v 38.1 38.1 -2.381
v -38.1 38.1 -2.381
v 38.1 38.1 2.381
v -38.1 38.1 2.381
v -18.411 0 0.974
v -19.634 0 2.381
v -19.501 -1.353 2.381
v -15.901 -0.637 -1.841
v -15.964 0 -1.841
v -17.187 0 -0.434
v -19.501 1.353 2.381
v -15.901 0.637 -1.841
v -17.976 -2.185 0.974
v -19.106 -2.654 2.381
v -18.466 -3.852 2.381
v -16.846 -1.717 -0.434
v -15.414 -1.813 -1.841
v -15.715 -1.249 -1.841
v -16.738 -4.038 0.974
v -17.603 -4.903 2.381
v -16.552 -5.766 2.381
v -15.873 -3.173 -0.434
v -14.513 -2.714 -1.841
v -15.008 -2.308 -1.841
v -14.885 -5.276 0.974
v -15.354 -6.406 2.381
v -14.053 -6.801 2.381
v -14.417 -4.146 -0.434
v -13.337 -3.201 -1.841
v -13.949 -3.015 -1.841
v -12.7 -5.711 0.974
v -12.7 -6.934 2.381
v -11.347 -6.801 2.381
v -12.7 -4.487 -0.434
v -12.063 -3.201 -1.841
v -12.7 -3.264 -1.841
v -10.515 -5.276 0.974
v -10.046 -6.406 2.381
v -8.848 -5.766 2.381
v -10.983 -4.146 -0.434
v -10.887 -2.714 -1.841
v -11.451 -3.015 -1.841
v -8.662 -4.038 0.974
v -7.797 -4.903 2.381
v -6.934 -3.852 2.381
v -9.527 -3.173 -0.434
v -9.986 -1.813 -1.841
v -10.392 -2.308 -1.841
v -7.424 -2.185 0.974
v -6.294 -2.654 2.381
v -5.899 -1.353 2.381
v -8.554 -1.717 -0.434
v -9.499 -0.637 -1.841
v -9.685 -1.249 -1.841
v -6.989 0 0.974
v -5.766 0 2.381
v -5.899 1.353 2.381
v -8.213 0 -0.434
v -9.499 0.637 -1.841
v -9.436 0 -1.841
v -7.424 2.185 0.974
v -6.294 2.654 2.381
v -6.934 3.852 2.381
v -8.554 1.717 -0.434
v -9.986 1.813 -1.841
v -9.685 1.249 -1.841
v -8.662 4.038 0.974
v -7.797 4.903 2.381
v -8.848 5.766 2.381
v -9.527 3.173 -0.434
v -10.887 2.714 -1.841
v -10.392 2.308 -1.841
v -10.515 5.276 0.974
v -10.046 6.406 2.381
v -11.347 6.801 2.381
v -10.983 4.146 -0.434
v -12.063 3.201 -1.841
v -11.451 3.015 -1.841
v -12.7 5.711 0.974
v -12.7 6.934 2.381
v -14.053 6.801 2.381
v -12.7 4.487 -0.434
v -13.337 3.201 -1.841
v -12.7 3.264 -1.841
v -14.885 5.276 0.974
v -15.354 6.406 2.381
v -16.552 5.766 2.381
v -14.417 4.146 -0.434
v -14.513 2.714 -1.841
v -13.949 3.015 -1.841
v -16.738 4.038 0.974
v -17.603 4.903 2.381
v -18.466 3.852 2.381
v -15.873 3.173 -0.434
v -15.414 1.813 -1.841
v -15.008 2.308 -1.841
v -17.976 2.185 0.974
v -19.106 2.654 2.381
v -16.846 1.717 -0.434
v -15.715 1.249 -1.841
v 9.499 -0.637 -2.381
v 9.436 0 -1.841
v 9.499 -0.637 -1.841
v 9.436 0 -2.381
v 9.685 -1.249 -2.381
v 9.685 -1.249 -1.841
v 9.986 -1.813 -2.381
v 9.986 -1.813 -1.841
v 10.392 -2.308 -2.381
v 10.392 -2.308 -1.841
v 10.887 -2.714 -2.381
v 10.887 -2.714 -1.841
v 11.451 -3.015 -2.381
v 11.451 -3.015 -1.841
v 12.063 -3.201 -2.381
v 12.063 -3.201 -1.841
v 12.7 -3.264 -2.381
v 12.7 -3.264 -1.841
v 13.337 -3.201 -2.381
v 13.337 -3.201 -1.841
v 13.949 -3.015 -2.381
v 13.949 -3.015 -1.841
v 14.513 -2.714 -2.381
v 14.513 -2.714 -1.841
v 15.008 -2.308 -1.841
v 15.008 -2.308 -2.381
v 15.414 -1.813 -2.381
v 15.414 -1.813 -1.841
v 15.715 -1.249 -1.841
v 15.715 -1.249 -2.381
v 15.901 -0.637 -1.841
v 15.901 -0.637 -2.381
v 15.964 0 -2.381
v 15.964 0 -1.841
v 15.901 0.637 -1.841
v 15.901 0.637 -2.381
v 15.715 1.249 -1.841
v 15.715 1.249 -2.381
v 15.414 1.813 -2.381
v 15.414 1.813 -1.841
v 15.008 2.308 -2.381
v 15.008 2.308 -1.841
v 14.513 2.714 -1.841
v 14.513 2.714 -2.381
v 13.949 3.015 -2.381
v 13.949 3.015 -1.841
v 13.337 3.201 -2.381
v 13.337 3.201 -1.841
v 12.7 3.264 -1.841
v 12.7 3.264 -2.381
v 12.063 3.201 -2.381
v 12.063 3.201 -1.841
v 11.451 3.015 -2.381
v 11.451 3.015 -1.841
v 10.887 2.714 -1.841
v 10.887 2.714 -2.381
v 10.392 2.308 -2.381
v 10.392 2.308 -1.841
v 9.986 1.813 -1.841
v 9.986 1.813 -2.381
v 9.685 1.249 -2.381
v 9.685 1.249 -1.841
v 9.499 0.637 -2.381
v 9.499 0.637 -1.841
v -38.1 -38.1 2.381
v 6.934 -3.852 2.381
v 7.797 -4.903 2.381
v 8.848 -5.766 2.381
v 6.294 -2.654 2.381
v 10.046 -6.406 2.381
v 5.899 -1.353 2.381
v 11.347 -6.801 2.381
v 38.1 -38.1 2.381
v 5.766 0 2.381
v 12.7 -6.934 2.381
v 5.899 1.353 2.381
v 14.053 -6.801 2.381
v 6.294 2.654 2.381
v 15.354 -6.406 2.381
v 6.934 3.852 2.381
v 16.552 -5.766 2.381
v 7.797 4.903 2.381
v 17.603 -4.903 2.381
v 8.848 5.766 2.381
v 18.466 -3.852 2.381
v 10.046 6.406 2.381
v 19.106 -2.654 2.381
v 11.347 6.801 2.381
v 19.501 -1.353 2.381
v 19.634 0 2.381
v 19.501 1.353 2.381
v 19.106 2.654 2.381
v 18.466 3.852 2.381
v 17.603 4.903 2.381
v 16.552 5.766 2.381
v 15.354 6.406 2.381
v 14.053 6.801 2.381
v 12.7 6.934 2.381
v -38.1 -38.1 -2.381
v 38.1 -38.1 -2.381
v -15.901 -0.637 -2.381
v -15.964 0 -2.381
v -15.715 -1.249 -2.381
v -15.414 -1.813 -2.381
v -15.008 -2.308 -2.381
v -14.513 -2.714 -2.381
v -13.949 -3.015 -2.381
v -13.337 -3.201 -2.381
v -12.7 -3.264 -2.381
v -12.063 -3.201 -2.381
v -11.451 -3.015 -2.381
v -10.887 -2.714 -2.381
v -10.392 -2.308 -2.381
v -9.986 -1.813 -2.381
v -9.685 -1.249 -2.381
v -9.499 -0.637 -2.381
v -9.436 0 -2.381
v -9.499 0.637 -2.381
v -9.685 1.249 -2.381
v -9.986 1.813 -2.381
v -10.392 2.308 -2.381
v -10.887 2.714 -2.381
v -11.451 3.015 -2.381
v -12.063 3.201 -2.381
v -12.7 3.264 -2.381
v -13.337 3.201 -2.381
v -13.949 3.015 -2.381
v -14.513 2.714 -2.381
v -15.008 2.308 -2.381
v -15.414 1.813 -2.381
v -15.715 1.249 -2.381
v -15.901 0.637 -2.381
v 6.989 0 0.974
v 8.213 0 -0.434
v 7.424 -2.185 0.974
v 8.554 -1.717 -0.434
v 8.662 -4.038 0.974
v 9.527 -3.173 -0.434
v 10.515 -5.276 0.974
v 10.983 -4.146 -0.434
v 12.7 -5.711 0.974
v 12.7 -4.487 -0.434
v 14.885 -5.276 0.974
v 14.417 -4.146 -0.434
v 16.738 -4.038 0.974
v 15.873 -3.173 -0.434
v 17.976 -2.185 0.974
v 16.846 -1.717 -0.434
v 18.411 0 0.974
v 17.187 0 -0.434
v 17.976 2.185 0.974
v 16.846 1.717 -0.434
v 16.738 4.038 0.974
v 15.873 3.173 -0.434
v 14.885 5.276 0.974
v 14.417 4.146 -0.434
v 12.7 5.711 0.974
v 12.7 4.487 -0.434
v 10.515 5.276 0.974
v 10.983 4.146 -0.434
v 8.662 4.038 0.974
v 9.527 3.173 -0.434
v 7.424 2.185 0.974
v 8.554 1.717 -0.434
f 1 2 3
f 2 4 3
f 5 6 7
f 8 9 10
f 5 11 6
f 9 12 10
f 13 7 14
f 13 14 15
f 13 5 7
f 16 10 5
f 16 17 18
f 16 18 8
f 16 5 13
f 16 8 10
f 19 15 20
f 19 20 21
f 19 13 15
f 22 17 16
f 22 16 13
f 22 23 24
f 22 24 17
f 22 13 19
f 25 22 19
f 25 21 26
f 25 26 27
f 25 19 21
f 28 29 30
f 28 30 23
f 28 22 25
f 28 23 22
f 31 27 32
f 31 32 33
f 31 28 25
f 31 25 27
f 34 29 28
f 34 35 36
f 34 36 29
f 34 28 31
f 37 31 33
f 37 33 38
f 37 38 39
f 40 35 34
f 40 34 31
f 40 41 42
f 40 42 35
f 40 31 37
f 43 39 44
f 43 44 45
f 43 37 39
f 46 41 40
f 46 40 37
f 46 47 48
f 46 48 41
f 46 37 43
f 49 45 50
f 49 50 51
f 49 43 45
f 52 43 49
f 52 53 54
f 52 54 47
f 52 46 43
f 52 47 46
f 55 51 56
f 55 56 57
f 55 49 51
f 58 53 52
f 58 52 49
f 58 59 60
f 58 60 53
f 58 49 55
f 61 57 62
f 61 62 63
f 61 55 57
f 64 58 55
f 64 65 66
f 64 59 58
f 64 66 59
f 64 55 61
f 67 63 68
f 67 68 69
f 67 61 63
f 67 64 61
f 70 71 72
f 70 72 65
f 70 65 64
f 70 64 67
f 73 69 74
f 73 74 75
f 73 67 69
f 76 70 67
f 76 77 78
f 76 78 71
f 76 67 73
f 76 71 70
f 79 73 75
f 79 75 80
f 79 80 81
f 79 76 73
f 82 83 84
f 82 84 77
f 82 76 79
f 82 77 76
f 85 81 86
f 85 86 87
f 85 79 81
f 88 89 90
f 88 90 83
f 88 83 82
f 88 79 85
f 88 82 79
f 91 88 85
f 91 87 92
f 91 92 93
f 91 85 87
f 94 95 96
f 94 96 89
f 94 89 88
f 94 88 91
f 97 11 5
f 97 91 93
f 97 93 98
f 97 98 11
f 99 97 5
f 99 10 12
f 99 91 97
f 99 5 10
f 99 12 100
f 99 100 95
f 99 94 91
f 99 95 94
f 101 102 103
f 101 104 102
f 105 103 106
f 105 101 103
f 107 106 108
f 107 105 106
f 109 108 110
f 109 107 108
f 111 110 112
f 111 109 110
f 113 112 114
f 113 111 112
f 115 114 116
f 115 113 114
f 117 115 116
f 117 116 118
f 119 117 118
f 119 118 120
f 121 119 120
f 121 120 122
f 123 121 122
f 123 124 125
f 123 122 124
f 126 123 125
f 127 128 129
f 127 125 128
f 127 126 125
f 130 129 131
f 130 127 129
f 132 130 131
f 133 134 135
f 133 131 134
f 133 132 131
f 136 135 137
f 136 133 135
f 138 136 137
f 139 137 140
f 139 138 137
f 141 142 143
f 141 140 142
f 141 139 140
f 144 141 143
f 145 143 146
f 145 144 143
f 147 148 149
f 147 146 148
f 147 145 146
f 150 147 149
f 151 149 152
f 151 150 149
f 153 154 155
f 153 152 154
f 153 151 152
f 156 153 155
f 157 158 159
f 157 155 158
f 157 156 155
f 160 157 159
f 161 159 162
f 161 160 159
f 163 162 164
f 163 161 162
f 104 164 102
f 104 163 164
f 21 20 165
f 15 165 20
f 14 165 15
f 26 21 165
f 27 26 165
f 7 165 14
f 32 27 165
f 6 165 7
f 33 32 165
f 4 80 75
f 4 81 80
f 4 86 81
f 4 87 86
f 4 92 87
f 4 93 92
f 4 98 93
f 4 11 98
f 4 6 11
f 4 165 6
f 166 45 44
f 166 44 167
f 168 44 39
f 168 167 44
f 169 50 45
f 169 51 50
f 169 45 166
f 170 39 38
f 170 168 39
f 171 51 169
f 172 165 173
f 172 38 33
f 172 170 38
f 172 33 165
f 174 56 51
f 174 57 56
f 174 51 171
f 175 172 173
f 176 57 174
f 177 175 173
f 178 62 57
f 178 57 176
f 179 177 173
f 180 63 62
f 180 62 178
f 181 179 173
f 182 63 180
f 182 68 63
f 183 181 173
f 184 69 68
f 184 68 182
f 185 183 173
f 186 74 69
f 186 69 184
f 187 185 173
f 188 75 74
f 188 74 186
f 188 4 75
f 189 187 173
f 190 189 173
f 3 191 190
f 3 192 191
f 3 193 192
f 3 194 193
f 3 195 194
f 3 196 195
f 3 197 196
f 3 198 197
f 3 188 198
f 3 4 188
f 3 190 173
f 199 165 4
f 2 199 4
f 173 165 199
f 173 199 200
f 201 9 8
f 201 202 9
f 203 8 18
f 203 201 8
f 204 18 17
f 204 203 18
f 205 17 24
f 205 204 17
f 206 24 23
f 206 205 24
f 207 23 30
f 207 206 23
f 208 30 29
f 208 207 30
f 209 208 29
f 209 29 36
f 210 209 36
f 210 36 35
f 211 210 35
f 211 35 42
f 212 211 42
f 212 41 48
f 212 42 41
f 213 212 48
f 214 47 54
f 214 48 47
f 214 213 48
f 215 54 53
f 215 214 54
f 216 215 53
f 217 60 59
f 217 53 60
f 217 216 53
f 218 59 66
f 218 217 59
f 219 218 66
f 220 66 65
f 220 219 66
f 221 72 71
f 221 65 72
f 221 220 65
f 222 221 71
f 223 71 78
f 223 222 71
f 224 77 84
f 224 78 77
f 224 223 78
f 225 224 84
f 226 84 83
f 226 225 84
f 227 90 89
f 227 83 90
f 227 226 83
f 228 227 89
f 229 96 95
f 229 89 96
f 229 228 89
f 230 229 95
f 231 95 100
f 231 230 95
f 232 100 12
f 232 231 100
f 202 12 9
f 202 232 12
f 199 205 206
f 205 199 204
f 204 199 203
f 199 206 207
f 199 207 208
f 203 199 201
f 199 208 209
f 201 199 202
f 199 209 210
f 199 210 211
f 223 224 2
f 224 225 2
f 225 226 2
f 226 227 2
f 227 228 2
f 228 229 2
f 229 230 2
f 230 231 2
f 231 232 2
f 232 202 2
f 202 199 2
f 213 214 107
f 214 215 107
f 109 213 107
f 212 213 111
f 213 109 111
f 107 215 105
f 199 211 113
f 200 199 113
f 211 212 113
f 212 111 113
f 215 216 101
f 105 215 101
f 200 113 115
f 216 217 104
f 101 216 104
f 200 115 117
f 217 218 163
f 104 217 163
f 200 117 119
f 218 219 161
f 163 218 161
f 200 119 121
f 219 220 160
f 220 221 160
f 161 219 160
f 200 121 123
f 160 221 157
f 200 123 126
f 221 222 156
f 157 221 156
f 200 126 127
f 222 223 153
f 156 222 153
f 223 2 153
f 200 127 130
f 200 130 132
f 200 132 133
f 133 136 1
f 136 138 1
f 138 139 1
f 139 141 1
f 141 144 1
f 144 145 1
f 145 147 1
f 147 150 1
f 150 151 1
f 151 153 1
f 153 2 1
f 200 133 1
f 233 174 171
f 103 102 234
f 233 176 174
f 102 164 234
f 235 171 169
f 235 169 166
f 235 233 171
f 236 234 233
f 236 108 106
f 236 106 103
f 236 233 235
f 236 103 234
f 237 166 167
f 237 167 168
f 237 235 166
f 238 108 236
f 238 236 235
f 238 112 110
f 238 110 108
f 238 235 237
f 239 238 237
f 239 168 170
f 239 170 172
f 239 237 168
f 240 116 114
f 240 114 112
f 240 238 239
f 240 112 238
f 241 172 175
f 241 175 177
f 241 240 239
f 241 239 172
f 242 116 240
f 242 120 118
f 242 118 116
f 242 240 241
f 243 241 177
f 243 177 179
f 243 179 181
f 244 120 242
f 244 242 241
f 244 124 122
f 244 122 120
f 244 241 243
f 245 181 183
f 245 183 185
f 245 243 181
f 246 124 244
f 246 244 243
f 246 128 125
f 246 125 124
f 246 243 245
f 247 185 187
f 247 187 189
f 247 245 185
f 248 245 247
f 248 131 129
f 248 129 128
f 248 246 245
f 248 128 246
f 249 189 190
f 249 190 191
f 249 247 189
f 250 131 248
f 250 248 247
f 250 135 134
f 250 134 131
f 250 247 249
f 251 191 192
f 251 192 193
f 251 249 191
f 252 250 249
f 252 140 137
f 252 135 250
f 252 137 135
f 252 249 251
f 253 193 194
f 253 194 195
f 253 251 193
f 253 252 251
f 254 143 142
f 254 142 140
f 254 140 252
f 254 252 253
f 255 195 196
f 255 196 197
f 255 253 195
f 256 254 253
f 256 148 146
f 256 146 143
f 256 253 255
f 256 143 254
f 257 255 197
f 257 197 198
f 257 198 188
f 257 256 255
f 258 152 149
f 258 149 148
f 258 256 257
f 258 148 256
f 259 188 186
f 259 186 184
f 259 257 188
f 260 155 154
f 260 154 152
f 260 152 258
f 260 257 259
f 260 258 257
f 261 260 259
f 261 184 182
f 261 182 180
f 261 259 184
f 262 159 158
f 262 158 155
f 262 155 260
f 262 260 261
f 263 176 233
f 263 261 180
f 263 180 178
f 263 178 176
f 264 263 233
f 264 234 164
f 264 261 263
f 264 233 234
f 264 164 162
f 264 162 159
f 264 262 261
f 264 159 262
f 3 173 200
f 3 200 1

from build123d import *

# Parameters (mm, degrees)
SKETCH1_W           = 76.2
SKETCH1_H           = 76.2
SKETCH1_R           = 3.2639
BOSS_EXTRUDE1_DEPTH = 2.38125


with BuildPart() as part:
    # Sketch1 → Boss-Extrude1 (new, symmetric)
    with BuildSketch(Plane.XY):
        Rectangle(SKETCH1_W, SKETCH1_H)
        with Locations(Location((-12.7, 0, 0), (0, 0, 180))):
            Circle(SKETCH1_R, mode=Mode.SUBTRACT)
        with Locations(Location((12.7, 0, 0), (0, 0, 180))):
            Circle(SKETCH1_R, mode=Mode.SUBTRACT)
    extrude(amount=BOSS_EXTRUDE1_DEPTH, both=True)

    # Sketch2 → Cut-Revolve1 (revolve, cut)
    with BuildSketch(Plane(origin=(0, 0, 0), x_dir=(1, 0, 0), z_dir=(0, 1, 0)), mode=Mode.PRIVATE) as cut_revolve1_sk:
        Polygon((-5.7658, -2.38125), (-12.7, 5.595634609), (-12.7, -2.38125), align=None)
    cut_revolve1 = revolve(cut_revolve1_sk.sketch.rotate(Axis((-12.7, 0, -5.595634609), (0, 0, 1)), 180), axis=Axis((-12.7, 0, -5.595634609), (0, 0, 1)), mode=Mode.SUBTRACT)

    # Sketch-Pattern1: Cut-Revolve1 at 1 more place
    with Locations((25.4, 0, 0)):
        add(cut_revolve1, mode=Mode.SUBTRACT)


solid = part.part
